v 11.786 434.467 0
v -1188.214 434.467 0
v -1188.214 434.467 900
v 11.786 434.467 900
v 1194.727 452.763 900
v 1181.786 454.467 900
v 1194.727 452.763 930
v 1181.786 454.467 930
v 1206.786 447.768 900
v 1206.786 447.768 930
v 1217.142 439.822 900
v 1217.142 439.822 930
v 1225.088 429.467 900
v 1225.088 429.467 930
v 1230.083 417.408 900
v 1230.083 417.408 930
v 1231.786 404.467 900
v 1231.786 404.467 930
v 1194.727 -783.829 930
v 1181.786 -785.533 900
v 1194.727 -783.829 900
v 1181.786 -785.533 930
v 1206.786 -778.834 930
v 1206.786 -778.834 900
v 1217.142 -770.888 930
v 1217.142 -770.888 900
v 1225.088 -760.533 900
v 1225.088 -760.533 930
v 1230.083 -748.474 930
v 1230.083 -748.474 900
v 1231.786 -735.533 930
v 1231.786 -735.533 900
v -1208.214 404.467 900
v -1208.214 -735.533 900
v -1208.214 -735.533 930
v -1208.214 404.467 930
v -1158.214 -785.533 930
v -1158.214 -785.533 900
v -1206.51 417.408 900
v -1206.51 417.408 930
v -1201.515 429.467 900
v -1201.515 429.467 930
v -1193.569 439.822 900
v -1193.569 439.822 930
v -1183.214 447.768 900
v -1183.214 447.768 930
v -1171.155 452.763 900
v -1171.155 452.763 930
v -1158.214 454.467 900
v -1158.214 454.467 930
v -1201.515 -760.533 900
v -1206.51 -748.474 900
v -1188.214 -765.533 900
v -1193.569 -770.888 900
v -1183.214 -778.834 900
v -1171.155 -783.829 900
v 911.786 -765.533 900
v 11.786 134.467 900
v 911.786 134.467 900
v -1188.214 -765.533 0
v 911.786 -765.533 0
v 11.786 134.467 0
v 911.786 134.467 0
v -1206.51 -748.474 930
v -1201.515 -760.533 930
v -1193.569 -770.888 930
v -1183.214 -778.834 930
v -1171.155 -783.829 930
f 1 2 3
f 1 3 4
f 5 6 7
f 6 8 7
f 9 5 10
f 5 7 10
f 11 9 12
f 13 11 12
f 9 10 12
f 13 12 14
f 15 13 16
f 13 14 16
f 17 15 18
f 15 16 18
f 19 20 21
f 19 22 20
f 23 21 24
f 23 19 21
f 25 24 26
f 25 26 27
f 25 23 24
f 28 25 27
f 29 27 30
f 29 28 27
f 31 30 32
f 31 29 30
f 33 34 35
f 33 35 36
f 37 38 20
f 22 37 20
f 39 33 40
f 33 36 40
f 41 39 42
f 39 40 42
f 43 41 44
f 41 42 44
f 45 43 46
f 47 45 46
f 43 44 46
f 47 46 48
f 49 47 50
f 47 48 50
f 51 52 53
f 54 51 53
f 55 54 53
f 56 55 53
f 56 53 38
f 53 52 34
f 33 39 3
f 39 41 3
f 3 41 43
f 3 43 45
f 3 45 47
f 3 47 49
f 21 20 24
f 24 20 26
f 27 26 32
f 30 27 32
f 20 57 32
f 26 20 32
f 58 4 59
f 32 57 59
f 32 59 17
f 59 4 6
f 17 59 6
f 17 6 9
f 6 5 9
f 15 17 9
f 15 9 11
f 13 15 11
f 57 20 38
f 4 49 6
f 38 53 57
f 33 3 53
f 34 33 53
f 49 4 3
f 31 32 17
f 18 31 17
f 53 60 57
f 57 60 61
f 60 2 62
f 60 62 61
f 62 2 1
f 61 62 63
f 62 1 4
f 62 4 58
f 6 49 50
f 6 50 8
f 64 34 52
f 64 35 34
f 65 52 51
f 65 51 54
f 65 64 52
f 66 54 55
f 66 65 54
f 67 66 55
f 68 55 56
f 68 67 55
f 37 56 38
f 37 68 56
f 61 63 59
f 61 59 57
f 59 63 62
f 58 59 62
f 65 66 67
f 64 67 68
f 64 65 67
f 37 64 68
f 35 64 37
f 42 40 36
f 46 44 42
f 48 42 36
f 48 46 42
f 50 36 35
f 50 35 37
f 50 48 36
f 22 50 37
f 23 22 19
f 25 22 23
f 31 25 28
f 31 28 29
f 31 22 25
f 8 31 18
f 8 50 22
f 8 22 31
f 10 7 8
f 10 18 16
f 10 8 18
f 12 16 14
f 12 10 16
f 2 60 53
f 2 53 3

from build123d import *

# Parameters (mm, degrees)
F0_W     = 2400
F0_H     = 1200
F1_DEPTH = 900
F2_W     = 2440
F2_H     = 1240
F3_DEPTH = 30
F4_W     = 300
F4_H     = 300
F4_W_2   = 900
F4_H_2   = 900
F5_DEPTH = 900
F6_R     = 50


with BuildPart() as f1:
    # F0 (on Top) → F1 (new body)
    with BuildSketch(Plane.XY):
        with Locations((11.786235, -165.532895)):
            Rectangle(F0_W, F0_H)
    extrude(amount=F1_DEPTH)

    # F2 (on face) → F3 (join)
    with BuildSketch(Plane.XY.offset(900)):
        with Locations((11.786235, -165.532895)):
            Rectangle(F2_W, F2_H)
    extrude(amount=F3_DEPTH)

    # F4 (on face) → F5 (cut)
    with BuildSketch(Plane(origin=(0, 0, 0), x_dir=(1, 0, 0), z_dir=(0, 0, -1))):
        with Locations((1061.786235, -284.467105)):
            Rectangle(F4_W, F4_H)
        with Locations((461.786235, -284.467105)):
            Rectangle(F4_W_2, F4_H)
        with Locations((1061.786235, 315.532895)):
            Rectangle(F4_W, F4_H_2)
    extrude(amount=-F5_DEPTH, mode=Mode.SUBTRACT)

    # F6
    f6_edges = [f1.edges().sort_by_distance(p)[0] for p in [
        (1231.786235, 454.467105, 915),
        (1231.786235, -785.532895, 915),
        (-1208.213765, 454.467105, 915),
        (-1208.213765, -785.532895, 915),
    ]]
    fillet(f6_edges, radius=F6_R)


solid = f1.part
